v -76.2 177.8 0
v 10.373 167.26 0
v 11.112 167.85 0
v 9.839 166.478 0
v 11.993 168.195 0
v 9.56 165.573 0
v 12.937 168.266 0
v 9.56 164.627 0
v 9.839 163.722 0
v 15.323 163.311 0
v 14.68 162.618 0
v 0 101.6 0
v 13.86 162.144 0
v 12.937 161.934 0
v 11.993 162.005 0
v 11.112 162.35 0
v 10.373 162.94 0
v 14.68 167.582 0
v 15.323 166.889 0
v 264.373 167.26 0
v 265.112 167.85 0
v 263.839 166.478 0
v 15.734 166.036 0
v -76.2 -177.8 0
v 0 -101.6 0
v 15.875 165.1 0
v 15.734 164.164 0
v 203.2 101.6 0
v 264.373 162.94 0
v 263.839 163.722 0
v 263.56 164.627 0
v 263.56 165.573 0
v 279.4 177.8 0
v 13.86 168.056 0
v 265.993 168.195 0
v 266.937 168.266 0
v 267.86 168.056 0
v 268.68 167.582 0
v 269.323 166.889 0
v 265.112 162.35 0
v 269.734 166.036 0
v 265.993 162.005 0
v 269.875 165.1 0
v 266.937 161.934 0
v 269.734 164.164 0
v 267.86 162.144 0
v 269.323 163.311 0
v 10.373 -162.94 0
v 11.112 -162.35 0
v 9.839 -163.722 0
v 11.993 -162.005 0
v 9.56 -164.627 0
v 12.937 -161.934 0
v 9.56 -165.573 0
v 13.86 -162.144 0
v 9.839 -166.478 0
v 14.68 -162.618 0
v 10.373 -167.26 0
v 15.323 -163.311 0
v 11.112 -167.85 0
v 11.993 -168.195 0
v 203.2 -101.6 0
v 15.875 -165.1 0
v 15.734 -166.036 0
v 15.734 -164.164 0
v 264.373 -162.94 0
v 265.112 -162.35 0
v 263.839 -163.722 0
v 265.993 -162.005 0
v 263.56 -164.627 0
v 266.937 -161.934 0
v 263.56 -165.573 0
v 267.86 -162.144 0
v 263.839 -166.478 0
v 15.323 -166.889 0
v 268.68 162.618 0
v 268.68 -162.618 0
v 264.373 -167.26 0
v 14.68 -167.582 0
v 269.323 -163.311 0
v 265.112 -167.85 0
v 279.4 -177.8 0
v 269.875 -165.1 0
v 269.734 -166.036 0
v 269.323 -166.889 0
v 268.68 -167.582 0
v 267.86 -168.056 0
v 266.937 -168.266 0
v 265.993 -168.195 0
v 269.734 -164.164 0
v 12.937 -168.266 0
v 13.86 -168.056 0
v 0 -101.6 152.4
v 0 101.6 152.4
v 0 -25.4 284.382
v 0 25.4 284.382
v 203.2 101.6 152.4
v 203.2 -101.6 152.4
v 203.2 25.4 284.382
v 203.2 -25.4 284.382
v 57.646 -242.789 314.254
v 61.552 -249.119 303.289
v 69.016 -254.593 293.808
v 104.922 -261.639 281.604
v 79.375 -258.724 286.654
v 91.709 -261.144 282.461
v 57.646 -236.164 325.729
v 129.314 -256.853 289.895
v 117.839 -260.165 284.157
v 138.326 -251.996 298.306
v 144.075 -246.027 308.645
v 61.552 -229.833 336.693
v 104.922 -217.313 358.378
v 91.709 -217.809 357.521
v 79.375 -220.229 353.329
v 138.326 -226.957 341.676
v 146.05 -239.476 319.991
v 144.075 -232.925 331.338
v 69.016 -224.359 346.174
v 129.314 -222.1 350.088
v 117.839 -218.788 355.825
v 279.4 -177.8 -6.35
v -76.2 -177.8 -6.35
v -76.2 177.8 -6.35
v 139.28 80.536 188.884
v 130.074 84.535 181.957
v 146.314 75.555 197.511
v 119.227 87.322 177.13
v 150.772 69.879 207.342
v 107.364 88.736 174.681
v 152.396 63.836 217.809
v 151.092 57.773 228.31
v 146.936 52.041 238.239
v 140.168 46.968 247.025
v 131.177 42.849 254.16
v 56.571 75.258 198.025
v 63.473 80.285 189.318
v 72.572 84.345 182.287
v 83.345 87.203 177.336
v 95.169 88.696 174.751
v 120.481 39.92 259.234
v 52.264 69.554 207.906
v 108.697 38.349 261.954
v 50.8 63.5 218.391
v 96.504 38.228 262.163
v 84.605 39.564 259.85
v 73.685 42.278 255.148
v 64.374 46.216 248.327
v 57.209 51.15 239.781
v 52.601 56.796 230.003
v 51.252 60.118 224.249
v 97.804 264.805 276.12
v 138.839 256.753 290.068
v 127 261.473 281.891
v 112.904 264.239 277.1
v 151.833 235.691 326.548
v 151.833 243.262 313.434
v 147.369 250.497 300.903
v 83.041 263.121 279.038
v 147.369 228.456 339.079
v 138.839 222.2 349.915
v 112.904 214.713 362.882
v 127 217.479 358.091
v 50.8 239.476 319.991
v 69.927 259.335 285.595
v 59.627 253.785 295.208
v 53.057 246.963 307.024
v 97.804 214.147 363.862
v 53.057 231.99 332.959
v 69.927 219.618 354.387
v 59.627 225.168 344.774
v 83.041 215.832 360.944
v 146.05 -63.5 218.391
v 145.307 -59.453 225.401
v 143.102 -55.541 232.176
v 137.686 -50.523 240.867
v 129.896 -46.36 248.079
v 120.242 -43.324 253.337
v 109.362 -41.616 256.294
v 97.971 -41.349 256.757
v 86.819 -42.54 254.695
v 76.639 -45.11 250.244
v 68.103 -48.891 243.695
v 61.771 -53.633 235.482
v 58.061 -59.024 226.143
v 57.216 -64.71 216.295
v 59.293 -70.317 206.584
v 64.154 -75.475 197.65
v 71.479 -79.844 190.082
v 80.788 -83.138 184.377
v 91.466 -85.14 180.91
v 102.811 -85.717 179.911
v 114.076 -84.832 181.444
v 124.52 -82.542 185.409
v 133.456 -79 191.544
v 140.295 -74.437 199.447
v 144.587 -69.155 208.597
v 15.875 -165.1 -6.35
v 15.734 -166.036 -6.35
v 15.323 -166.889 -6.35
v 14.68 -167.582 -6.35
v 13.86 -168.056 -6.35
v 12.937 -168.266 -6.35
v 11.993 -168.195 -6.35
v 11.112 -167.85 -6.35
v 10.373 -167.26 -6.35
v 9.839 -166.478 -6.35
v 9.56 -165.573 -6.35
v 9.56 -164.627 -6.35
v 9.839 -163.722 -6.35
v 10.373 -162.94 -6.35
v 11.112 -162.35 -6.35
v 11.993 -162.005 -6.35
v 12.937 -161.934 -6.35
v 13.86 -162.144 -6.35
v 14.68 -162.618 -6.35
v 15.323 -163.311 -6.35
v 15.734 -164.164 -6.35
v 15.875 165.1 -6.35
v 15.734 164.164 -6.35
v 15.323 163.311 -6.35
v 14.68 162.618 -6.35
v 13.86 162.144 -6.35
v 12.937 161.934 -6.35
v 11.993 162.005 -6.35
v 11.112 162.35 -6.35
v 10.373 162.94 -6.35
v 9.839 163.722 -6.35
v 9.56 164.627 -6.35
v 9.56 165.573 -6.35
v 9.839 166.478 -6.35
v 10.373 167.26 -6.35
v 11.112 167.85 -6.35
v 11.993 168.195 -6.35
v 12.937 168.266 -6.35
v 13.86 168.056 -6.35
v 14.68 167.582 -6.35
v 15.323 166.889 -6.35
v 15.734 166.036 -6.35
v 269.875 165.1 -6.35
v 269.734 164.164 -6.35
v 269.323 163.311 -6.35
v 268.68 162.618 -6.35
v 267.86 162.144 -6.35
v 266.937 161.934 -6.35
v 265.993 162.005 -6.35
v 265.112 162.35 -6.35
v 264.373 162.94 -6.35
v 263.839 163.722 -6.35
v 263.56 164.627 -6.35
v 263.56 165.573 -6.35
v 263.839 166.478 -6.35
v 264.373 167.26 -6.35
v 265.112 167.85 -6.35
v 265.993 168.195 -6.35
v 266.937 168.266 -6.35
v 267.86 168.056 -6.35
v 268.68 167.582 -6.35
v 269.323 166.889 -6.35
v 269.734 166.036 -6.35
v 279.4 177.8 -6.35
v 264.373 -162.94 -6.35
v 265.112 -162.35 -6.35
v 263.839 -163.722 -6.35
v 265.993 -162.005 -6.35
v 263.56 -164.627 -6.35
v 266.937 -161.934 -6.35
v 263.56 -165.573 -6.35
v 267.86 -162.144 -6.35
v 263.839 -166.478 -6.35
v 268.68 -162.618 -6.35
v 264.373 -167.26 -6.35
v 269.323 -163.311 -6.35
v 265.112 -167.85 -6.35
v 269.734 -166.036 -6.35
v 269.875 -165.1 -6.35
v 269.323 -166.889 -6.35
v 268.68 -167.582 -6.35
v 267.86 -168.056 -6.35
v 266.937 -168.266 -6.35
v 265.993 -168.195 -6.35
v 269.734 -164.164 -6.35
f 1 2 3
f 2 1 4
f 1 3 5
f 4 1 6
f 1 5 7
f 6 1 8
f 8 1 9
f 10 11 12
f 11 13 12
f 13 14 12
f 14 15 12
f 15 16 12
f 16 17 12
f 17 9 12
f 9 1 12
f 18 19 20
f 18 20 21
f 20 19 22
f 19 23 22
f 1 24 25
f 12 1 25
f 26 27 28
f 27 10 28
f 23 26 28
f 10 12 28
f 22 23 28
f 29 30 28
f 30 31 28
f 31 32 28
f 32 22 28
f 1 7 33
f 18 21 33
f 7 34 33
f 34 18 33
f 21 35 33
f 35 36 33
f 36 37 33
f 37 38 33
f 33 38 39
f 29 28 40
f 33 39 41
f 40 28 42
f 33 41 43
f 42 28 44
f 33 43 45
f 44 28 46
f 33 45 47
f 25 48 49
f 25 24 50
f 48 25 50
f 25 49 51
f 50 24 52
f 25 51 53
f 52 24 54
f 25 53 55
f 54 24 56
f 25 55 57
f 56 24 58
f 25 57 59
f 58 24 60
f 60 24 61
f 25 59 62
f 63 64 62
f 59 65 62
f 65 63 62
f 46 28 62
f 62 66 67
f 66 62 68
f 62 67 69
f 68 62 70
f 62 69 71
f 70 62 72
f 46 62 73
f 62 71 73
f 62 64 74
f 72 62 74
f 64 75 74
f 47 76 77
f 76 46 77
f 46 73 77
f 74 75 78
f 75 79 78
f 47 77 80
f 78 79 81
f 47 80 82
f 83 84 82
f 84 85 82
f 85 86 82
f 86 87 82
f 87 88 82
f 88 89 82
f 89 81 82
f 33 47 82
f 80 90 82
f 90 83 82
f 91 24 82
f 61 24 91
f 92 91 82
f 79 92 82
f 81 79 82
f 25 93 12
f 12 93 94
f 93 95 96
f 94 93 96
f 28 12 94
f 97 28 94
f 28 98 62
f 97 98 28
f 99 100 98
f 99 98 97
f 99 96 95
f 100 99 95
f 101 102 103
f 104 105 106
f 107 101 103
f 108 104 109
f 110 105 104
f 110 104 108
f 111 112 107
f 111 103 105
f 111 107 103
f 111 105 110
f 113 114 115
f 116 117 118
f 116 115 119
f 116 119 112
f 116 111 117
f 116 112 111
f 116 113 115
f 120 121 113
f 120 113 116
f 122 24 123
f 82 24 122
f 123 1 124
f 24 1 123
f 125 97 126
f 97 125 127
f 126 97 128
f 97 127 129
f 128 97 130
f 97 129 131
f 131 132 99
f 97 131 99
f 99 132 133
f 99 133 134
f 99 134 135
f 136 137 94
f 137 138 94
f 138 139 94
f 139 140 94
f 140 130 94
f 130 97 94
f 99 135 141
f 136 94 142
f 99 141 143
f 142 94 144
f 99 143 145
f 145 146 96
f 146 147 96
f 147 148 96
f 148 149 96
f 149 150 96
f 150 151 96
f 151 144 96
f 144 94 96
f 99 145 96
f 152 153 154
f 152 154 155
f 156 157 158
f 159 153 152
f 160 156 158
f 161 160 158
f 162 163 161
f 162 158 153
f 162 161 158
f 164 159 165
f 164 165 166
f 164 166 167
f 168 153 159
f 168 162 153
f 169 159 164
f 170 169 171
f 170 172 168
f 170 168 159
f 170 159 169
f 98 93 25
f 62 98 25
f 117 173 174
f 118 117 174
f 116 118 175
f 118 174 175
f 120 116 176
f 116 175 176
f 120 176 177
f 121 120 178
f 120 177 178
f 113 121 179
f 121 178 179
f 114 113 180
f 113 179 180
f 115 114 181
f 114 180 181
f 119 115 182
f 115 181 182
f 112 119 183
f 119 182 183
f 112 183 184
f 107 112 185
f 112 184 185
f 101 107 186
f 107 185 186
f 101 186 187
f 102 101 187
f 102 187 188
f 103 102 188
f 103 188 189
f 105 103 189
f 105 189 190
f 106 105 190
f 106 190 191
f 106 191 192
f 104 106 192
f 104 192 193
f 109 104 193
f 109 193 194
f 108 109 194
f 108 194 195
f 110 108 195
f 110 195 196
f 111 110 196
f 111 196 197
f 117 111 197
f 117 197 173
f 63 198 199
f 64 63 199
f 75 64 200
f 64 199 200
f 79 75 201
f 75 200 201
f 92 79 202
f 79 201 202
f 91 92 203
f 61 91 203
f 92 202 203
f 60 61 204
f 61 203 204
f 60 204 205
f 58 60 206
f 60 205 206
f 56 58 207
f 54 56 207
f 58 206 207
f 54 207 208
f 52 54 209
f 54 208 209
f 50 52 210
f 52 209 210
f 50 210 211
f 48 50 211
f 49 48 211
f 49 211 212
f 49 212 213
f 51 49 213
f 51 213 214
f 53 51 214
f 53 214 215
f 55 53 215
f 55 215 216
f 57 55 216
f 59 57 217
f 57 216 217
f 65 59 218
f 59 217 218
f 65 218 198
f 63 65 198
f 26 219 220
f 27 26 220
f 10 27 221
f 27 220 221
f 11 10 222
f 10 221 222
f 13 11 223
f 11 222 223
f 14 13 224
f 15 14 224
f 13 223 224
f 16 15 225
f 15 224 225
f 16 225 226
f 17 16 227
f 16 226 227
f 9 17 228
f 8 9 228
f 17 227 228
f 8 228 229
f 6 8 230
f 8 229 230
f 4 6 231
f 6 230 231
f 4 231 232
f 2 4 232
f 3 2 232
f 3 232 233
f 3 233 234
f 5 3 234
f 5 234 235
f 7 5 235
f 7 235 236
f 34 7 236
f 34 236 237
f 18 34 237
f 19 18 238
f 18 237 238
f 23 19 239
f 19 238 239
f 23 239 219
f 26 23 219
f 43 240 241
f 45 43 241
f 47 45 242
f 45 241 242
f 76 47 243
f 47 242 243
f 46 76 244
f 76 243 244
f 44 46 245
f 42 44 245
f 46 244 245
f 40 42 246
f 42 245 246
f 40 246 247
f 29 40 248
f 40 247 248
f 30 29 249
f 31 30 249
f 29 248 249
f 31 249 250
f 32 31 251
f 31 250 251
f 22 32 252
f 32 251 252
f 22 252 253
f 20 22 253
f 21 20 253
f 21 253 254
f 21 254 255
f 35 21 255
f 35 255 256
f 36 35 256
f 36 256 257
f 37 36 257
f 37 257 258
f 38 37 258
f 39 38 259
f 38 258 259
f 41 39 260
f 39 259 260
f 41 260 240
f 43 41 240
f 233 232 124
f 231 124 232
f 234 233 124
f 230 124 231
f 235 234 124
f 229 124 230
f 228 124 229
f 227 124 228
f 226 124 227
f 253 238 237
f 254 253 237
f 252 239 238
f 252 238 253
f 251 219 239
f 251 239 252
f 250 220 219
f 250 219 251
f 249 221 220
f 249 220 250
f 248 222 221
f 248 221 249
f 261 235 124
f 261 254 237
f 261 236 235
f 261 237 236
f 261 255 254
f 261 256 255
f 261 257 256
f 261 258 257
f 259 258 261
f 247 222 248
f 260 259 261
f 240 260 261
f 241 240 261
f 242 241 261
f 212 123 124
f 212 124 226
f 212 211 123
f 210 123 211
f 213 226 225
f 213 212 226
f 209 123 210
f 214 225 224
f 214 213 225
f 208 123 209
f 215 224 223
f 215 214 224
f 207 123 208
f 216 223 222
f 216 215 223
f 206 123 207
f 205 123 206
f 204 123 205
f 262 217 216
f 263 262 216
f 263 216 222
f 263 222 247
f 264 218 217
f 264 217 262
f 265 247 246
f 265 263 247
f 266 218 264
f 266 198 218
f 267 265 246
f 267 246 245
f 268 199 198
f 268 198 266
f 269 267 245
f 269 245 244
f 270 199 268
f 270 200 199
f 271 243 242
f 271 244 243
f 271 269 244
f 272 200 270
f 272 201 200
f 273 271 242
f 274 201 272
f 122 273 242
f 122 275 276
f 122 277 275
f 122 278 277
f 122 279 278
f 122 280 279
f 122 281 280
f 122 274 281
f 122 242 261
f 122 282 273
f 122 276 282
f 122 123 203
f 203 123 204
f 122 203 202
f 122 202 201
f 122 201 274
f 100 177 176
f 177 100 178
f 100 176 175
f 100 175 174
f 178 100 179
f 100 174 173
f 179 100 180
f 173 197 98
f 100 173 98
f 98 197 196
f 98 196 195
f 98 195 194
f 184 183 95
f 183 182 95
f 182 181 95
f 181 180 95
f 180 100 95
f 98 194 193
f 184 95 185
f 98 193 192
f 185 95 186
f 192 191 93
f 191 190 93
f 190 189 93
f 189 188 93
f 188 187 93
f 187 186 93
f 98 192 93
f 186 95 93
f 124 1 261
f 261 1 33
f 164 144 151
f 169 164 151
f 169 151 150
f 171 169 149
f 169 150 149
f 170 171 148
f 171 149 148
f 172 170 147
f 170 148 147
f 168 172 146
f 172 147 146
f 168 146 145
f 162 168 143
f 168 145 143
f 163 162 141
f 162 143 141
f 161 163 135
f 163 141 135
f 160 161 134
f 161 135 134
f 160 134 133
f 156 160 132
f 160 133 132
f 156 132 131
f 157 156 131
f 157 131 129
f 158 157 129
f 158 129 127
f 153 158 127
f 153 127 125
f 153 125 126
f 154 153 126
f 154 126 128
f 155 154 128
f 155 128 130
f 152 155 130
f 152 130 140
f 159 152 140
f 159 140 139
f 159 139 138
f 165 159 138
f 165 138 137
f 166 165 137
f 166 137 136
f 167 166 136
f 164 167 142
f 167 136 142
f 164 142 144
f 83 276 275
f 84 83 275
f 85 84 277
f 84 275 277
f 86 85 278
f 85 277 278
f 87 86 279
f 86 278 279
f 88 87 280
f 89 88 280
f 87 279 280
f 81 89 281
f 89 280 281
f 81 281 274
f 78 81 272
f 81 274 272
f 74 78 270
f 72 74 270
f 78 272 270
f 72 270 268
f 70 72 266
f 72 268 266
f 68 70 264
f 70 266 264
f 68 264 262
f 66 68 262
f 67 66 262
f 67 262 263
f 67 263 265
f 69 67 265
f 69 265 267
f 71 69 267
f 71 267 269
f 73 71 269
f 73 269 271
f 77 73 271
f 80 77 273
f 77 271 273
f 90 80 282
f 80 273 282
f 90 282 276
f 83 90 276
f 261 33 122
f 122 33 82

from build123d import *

# Parameters (mm, degrees)
F1_DEPTH = 203.2
F2_R     = 50.8
F3_DEPTH = 203.2
F4_R     = 44.45
F5_DEPTH = 203.2
F6_W     = 355.6
F6_H     = 355.6
F7_DEPTH = 6.35
F8_R     = 3.175
F9_DEPTH = 6.35


with BuildPart() as f1:
    # F0 (on Right) → F1 (new body)
    with BuildSketch(Plane.YZ):
        Polygon((-101.6, 152.4), (-101.6, 0), (101.6, 0), (101.6, 152.4), (25.4, 284.382272), (-25.4, 284.382272), align=None)
    extrude(amount=F1_DEPTH)

    # F2 (on face) → F3 (join)
    with BuildSketch(Plane(origin=(0, 142.191136, 82.094091), x_dir=(-1, 0, 0), z_dir=(0, 0.866025, 0.5))):
        with Locations((-101.6, 157.382272)):
            Circle(F2_R)
    extrude(amount=F3_DEPTH)

    # F4 (on face) → F5 (join)
    with BuildSketch(Plane(origin=(0, -142.191136, 82.094091), x_dir=(1, 0, 0), z_dir=(0, -0.866025, 0.5))):
        with Locations((101.6, 157.382272)):
            Circle(F4_R)
    extrude(amount=F5_DEPTH)

    # F6 (on face) → F7 (join)
    with BuildSketch(Plane(origin=(0, 0, 0), x_dir=(1, 0, 0), z_dir=(0, 0, -1))):
        with Locations((101.6, 0)):
            Rectangle(F6_W, F6_H)
    extrude(amount=F7_DEPTH)

    # F8 (on face) → F9 (cut, through all)
    with BuildSketch(Plane(origin=(0, 0, -6.35), x_dir=(1, 0, 0), z_dir=(0, 0, -1))):
        with Locations((266.7, 165.1)):
            Circle(F8_R)
        with Locations((266.7, -165.1)):
            Circle(F8_R)
        with Locations((12.7, -165.1)):
            Circle(F8_R)
        with Locations((12.7, 165.1)):
            Circle(F8_R)
    extrude(amount=-F9_DEPTH, mode=Mode.SUBTRACT)


solid = f1.part
